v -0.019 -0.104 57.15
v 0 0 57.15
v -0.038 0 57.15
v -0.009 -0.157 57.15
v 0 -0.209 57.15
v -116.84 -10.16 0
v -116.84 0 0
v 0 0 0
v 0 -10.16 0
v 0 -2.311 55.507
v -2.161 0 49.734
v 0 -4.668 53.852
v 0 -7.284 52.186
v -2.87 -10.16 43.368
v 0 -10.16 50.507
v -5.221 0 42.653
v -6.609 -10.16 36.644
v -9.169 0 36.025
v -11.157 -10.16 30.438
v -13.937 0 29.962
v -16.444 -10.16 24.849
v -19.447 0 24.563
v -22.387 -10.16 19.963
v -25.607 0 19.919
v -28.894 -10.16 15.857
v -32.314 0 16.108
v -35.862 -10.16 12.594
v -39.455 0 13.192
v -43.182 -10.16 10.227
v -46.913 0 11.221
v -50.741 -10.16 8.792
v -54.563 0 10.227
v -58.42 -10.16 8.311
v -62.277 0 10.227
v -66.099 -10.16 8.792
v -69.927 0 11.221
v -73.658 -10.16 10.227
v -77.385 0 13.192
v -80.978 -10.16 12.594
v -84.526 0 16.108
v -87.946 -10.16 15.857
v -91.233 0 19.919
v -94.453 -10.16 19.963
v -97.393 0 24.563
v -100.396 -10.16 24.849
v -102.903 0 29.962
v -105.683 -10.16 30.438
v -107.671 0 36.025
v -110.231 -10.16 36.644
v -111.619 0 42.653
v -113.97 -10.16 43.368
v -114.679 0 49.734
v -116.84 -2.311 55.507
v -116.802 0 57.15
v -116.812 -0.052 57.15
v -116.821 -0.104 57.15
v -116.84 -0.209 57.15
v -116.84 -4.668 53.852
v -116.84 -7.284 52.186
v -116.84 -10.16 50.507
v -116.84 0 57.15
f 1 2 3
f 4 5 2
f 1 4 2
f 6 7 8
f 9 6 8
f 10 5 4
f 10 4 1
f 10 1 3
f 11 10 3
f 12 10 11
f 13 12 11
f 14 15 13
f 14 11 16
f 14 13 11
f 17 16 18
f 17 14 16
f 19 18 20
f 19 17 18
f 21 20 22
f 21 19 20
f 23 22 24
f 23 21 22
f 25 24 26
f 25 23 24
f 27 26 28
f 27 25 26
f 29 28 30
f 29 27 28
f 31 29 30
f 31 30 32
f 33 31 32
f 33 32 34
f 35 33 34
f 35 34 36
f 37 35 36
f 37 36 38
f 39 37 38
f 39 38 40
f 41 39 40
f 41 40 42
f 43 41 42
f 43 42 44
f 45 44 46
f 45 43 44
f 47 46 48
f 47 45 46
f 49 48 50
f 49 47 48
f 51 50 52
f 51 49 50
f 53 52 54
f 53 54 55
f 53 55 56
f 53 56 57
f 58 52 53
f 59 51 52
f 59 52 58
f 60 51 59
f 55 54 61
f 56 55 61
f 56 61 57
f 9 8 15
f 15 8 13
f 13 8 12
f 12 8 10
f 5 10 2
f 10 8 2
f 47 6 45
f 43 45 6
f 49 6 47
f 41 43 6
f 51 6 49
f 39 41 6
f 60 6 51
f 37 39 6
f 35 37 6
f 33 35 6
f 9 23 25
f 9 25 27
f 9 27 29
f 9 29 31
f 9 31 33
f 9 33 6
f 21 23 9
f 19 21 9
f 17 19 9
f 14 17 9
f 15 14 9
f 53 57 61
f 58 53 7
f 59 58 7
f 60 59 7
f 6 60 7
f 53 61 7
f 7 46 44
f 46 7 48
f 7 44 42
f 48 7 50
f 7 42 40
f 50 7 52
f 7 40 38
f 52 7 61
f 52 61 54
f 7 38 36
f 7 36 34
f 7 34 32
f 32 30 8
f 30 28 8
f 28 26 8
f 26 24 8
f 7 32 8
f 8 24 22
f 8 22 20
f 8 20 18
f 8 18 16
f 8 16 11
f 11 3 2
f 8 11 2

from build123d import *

# Parameters (mm, degrees)
F1_DEPTH    = 10.16
F2_T2_ANGLE = 284.1697303729


# Not quite as in the source:
# - a fillet or chamfer that OpenCascade refuses, or shapes differently, is made with other operations: its cross-section is extruded or revolved along the edge and cut away or added


with BuildPart() as f1:
    # F0 (on Front) → F1 (new body)
    with BuildSketch(Plane.XZ):
        with BuildLine():
            Line((-116.84, 0), (0, 0))
            Line((0, 0), (0, 57.15))
            Line((0, 57.15), (-2.6989761401, 57.15))
            ThreePointArc((-2.6989761401, 57.15), (-58.42, 12.7), (-114.1410238599, 57.15))
            Line((-114.1410238599, 57.15), (-116.84, 57.15))
            Line((-116.84, 57.15), (-116.84, 0))
        make_face()
    extrude(amount=F1_DEPTH)

    # F2: chamfer of 24.892 x 4.3891312038 on 1 edges, made by hand

    # F2_s1 → F2_t2 (revolve, cut)
    with BuildSketch(Plane(origin=(-70.2228677722, 0, 54.6968082658), x_dir=(0, 1, 0), z_dir=(-0.7889217924, 0, 0.6144936171))):
        Polygon((14.732, -76.3574700932), (-10.16, -80.746601297), (-10.16, -76.3574700932), align=None)
    revolve(axis=Axis((-58.42, -10.16, 69.85), (0, 1, 0)), revolution_arc=F2_T2_ANGLE, mode=Mode.SUBTRACT)


solid = f1.part
